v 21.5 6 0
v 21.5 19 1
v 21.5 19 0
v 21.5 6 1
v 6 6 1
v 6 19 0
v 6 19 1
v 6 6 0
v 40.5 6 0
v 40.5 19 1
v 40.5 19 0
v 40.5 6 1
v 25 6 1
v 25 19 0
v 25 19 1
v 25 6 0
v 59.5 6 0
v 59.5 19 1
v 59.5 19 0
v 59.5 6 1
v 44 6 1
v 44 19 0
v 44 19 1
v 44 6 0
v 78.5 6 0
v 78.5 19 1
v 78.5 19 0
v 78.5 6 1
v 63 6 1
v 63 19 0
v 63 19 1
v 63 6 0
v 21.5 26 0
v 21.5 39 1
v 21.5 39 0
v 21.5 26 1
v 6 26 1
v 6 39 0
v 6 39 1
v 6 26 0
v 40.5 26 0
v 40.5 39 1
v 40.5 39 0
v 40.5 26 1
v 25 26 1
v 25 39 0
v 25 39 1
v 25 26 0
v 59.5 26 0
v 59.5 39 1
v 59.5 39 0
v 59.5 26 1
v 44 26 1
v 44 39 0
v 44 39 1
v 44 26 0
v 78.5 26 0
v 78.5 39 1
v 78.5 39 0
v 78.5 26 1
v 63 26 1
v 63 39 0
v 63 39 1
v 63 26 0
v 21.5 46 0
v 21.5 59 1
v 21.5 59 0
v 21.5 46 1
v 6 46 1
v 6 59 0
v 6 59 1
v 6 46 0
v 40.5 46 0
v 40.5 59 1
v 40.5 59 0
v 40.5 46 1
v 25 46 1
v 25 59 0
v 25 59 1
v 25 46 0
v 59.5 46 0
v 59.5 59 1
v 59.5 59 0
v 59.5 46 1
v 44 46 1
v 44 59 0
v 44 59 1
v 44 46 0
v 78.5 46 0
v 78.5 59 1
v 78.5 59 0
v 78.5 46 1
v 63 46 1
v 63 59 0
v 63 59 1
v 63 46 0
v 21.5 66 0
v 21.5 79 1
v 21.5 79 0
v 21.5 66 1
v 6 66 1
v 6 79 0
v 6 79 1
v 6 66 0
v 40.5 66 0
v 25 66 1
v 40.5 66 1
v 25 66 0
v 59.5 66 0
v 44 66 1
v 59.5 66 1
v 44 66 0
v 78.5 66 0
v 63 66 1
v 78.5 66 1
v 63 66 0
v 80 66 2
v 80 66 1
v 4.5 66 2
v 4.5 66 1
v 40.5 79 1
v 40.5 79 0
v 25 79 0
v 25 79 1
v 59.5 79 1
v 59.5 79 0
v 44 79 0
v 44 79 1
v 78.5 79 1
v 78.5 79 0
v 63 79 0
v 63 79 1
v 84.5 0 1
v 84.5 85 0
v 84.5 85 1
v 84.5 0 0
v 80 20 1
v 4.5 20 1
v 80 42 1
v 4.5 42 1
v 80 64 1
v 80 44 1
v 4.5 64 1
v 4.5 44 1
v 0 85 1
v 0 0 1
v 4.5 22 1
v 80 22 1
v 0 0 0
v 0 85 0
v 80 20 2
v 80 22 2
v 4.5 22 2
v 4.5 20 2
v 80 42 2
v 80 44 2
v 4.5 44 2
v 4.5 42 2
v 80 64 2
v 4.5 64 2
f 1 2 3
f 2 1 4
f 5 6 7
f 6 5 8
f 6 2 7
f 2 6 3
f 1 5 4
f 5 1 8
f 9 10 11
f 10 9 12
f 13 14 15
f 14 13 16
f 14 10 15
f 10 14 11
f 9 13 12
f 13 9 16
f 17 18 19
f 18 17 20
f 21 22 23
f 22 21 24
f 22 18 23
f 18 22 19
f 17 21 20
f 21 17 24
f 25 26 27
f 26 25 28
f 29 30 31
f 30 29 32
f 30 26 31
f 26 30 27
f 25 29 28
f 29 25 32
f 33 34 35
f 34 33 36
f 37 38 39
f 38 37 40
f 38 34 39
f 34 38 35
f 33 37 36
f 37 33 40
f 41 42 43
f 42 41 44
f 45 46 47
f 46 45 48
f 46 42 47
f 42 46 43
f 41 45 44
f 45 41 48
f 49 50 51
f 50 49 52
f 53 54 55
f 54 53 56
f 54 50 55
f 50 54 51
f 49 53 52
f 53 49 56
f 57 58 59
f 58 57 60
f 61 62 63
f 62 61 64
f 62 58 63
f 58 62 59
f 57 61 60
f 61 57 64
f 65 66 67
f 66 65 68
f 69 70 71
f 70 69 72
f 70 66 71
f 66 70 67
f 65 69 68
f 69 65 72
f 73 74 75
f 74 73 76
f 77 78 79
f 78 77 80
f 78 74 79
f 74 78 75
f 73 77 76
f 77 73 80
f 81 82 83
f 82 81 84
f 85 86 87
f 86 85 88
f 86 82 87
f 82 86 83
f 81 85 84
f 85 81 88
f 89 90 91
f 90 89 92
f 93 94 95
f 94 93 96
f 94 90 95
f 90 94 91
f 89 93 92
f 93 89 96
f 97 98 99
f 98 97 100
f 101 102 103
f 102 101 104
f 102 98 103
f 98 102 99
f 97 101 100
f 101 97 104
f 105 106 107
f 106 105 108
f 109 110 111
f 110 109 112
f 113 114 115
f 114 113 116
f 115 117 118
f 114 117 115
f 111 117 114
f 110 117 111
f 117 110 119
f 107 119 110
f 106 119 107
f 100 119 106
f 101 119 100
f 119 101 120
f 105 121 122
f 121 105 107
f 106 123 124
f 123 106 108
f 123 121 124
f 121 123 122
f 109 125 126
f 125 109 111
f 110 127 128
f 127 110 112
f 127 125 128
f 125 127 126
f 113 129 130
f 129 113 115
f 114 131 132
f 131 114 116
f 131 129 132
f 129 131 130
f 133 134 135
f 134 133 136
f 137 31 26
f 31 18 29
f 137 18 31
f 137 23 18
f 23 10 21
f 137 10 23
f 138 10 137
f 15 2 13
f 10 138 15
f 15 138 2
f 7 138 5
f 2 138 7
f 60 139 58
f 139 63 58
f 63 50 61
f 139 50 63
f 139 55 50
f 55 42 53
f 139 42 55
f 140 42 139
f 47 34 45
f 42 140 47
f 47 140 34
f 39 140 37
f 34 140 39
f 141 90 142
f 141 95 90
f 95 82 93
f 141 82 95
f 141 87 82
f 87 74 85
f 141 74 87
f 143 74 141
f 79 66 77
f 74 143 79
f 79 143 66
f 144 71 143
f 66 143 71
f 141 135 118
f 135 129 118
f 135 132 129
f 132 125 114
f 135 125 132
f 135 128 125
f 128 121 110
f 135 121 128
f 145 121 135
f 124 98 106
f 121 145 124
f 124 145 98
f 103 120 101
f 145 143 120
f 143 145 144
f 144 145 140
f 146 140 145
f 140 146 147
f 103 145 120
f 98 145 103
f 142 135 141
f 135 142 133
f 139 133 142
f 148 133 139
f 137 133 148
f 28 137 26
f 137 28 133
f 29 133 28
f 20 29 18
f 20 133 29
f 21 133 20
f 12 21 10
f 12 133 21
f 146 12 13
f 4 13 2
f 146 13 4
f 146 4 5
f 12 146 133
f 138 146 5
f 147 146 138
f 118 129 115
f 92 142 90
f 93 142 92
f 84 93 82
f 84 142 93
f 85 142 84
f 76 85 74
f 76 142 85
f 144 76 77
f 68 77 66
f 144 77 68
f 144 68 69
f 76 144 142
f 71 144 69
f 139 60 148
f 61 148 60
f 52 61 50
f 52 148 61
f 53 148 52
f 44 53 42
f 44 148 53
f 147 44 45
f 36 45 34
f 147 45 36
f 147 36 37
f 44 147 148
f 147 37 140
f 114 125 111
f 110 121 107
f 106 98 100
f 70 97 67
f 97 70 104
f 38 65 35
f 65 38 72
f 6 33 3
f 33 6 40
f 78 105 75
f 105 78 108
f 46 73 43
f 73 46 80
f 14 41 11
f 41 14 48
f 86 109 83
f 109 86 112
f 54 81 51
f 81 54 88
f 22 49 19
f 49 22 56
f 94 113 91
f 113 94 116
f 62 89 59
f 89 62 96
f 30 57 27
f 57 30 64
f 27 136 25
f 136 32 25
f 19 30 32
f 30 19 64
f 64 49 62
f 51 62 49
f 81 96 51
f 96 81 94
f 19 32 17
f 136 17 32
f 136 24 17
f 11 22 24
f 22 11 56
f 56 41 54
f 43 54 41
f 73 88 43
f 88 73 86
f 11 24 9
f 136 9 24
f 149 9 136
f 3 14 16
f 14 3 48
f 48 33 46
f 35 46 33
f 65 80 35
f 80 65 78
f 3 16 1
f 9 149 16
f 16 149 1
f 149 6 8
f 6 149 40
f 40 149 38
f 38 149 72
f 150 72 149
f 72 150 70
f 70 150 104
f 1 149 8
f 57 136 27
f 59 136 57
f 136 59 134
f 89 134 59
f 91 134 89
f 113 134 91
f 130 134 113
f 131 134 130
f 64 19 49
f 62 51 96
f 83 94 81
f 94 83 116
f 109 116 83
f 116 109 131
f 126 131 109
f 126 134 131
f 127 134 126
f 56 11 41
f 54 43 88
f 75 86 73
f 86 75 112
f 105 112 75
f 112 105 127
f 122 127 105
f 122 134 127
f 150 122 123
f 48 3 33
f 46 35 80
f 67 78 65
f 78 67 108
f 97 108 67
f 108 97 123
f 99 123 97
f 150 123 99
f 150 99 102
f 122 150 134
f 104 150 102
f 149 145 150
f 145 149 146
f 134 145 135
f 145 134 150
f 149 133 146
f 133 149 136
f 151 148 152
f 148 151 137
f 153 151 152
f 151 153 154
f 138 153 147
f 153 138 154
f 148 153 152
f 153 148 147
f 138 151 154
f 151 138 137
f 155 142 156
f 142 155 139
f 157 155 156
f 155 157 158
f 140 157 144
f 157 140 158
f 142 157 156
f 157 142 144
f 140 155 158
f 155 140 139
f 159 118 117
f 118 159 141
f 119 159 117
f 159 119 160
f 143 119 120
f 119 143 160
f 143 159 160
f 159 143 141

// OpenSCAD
/* KeySizeTest
 * Make a small 2x2 matrix to test keyholes.
 */
keyCols = 4;
keyRows = 4;
keyX = 15.5;
keyY = 13;
keySpace = 3.5;
edgeSpaceAddition = 4;
edgeSpace = (edgeSpaceAddition*2)-keySpace;
keyZ = -1;

moduleX = (edgeSpace+edgeSpaceAddition)+(keySpace*keyCols)+keyX*(keyCols-1)+keyX;
moduleY = (edgeSpace+edgeSpaceAddition-keySpace)+(keySpace*2*keyRows)+keyY*(keyRows-1)+keyY;
moduleZ = 1;

keySize = [keyX, keyY, moduleZ+2];

function position(x,y,z) = [edgeSpace+keySpace*x+keyX*(x-1)-(edgeSpaceAddition/2), edgeSpace-keySpace+(keySpace*2)*y+keyY*(y-1)-(edgeSpaceAddition/2), z];

module keyHoles (yStart, yEnd, xStart, xEnd){
  for(y = [yStart:yEnd]){
    for(x = [xStart:xEnd]){
      translate(position(x,y,keyZ)) cube(keySize);
    }
  }
}

module beam (bStart, bEnd){
  for (b = [bStart:bEnd]){  
    translate([edgeSpace,b*22-2,0]){  
      cube([moduleX-(edgeSpace*2),2,2]);
    }
  }
}


difference(){
  cube([moduleX,moduleY,moduleZ]);
  keyHoles(1,4,1,4);
  }
beam(1, keyRows-1);
